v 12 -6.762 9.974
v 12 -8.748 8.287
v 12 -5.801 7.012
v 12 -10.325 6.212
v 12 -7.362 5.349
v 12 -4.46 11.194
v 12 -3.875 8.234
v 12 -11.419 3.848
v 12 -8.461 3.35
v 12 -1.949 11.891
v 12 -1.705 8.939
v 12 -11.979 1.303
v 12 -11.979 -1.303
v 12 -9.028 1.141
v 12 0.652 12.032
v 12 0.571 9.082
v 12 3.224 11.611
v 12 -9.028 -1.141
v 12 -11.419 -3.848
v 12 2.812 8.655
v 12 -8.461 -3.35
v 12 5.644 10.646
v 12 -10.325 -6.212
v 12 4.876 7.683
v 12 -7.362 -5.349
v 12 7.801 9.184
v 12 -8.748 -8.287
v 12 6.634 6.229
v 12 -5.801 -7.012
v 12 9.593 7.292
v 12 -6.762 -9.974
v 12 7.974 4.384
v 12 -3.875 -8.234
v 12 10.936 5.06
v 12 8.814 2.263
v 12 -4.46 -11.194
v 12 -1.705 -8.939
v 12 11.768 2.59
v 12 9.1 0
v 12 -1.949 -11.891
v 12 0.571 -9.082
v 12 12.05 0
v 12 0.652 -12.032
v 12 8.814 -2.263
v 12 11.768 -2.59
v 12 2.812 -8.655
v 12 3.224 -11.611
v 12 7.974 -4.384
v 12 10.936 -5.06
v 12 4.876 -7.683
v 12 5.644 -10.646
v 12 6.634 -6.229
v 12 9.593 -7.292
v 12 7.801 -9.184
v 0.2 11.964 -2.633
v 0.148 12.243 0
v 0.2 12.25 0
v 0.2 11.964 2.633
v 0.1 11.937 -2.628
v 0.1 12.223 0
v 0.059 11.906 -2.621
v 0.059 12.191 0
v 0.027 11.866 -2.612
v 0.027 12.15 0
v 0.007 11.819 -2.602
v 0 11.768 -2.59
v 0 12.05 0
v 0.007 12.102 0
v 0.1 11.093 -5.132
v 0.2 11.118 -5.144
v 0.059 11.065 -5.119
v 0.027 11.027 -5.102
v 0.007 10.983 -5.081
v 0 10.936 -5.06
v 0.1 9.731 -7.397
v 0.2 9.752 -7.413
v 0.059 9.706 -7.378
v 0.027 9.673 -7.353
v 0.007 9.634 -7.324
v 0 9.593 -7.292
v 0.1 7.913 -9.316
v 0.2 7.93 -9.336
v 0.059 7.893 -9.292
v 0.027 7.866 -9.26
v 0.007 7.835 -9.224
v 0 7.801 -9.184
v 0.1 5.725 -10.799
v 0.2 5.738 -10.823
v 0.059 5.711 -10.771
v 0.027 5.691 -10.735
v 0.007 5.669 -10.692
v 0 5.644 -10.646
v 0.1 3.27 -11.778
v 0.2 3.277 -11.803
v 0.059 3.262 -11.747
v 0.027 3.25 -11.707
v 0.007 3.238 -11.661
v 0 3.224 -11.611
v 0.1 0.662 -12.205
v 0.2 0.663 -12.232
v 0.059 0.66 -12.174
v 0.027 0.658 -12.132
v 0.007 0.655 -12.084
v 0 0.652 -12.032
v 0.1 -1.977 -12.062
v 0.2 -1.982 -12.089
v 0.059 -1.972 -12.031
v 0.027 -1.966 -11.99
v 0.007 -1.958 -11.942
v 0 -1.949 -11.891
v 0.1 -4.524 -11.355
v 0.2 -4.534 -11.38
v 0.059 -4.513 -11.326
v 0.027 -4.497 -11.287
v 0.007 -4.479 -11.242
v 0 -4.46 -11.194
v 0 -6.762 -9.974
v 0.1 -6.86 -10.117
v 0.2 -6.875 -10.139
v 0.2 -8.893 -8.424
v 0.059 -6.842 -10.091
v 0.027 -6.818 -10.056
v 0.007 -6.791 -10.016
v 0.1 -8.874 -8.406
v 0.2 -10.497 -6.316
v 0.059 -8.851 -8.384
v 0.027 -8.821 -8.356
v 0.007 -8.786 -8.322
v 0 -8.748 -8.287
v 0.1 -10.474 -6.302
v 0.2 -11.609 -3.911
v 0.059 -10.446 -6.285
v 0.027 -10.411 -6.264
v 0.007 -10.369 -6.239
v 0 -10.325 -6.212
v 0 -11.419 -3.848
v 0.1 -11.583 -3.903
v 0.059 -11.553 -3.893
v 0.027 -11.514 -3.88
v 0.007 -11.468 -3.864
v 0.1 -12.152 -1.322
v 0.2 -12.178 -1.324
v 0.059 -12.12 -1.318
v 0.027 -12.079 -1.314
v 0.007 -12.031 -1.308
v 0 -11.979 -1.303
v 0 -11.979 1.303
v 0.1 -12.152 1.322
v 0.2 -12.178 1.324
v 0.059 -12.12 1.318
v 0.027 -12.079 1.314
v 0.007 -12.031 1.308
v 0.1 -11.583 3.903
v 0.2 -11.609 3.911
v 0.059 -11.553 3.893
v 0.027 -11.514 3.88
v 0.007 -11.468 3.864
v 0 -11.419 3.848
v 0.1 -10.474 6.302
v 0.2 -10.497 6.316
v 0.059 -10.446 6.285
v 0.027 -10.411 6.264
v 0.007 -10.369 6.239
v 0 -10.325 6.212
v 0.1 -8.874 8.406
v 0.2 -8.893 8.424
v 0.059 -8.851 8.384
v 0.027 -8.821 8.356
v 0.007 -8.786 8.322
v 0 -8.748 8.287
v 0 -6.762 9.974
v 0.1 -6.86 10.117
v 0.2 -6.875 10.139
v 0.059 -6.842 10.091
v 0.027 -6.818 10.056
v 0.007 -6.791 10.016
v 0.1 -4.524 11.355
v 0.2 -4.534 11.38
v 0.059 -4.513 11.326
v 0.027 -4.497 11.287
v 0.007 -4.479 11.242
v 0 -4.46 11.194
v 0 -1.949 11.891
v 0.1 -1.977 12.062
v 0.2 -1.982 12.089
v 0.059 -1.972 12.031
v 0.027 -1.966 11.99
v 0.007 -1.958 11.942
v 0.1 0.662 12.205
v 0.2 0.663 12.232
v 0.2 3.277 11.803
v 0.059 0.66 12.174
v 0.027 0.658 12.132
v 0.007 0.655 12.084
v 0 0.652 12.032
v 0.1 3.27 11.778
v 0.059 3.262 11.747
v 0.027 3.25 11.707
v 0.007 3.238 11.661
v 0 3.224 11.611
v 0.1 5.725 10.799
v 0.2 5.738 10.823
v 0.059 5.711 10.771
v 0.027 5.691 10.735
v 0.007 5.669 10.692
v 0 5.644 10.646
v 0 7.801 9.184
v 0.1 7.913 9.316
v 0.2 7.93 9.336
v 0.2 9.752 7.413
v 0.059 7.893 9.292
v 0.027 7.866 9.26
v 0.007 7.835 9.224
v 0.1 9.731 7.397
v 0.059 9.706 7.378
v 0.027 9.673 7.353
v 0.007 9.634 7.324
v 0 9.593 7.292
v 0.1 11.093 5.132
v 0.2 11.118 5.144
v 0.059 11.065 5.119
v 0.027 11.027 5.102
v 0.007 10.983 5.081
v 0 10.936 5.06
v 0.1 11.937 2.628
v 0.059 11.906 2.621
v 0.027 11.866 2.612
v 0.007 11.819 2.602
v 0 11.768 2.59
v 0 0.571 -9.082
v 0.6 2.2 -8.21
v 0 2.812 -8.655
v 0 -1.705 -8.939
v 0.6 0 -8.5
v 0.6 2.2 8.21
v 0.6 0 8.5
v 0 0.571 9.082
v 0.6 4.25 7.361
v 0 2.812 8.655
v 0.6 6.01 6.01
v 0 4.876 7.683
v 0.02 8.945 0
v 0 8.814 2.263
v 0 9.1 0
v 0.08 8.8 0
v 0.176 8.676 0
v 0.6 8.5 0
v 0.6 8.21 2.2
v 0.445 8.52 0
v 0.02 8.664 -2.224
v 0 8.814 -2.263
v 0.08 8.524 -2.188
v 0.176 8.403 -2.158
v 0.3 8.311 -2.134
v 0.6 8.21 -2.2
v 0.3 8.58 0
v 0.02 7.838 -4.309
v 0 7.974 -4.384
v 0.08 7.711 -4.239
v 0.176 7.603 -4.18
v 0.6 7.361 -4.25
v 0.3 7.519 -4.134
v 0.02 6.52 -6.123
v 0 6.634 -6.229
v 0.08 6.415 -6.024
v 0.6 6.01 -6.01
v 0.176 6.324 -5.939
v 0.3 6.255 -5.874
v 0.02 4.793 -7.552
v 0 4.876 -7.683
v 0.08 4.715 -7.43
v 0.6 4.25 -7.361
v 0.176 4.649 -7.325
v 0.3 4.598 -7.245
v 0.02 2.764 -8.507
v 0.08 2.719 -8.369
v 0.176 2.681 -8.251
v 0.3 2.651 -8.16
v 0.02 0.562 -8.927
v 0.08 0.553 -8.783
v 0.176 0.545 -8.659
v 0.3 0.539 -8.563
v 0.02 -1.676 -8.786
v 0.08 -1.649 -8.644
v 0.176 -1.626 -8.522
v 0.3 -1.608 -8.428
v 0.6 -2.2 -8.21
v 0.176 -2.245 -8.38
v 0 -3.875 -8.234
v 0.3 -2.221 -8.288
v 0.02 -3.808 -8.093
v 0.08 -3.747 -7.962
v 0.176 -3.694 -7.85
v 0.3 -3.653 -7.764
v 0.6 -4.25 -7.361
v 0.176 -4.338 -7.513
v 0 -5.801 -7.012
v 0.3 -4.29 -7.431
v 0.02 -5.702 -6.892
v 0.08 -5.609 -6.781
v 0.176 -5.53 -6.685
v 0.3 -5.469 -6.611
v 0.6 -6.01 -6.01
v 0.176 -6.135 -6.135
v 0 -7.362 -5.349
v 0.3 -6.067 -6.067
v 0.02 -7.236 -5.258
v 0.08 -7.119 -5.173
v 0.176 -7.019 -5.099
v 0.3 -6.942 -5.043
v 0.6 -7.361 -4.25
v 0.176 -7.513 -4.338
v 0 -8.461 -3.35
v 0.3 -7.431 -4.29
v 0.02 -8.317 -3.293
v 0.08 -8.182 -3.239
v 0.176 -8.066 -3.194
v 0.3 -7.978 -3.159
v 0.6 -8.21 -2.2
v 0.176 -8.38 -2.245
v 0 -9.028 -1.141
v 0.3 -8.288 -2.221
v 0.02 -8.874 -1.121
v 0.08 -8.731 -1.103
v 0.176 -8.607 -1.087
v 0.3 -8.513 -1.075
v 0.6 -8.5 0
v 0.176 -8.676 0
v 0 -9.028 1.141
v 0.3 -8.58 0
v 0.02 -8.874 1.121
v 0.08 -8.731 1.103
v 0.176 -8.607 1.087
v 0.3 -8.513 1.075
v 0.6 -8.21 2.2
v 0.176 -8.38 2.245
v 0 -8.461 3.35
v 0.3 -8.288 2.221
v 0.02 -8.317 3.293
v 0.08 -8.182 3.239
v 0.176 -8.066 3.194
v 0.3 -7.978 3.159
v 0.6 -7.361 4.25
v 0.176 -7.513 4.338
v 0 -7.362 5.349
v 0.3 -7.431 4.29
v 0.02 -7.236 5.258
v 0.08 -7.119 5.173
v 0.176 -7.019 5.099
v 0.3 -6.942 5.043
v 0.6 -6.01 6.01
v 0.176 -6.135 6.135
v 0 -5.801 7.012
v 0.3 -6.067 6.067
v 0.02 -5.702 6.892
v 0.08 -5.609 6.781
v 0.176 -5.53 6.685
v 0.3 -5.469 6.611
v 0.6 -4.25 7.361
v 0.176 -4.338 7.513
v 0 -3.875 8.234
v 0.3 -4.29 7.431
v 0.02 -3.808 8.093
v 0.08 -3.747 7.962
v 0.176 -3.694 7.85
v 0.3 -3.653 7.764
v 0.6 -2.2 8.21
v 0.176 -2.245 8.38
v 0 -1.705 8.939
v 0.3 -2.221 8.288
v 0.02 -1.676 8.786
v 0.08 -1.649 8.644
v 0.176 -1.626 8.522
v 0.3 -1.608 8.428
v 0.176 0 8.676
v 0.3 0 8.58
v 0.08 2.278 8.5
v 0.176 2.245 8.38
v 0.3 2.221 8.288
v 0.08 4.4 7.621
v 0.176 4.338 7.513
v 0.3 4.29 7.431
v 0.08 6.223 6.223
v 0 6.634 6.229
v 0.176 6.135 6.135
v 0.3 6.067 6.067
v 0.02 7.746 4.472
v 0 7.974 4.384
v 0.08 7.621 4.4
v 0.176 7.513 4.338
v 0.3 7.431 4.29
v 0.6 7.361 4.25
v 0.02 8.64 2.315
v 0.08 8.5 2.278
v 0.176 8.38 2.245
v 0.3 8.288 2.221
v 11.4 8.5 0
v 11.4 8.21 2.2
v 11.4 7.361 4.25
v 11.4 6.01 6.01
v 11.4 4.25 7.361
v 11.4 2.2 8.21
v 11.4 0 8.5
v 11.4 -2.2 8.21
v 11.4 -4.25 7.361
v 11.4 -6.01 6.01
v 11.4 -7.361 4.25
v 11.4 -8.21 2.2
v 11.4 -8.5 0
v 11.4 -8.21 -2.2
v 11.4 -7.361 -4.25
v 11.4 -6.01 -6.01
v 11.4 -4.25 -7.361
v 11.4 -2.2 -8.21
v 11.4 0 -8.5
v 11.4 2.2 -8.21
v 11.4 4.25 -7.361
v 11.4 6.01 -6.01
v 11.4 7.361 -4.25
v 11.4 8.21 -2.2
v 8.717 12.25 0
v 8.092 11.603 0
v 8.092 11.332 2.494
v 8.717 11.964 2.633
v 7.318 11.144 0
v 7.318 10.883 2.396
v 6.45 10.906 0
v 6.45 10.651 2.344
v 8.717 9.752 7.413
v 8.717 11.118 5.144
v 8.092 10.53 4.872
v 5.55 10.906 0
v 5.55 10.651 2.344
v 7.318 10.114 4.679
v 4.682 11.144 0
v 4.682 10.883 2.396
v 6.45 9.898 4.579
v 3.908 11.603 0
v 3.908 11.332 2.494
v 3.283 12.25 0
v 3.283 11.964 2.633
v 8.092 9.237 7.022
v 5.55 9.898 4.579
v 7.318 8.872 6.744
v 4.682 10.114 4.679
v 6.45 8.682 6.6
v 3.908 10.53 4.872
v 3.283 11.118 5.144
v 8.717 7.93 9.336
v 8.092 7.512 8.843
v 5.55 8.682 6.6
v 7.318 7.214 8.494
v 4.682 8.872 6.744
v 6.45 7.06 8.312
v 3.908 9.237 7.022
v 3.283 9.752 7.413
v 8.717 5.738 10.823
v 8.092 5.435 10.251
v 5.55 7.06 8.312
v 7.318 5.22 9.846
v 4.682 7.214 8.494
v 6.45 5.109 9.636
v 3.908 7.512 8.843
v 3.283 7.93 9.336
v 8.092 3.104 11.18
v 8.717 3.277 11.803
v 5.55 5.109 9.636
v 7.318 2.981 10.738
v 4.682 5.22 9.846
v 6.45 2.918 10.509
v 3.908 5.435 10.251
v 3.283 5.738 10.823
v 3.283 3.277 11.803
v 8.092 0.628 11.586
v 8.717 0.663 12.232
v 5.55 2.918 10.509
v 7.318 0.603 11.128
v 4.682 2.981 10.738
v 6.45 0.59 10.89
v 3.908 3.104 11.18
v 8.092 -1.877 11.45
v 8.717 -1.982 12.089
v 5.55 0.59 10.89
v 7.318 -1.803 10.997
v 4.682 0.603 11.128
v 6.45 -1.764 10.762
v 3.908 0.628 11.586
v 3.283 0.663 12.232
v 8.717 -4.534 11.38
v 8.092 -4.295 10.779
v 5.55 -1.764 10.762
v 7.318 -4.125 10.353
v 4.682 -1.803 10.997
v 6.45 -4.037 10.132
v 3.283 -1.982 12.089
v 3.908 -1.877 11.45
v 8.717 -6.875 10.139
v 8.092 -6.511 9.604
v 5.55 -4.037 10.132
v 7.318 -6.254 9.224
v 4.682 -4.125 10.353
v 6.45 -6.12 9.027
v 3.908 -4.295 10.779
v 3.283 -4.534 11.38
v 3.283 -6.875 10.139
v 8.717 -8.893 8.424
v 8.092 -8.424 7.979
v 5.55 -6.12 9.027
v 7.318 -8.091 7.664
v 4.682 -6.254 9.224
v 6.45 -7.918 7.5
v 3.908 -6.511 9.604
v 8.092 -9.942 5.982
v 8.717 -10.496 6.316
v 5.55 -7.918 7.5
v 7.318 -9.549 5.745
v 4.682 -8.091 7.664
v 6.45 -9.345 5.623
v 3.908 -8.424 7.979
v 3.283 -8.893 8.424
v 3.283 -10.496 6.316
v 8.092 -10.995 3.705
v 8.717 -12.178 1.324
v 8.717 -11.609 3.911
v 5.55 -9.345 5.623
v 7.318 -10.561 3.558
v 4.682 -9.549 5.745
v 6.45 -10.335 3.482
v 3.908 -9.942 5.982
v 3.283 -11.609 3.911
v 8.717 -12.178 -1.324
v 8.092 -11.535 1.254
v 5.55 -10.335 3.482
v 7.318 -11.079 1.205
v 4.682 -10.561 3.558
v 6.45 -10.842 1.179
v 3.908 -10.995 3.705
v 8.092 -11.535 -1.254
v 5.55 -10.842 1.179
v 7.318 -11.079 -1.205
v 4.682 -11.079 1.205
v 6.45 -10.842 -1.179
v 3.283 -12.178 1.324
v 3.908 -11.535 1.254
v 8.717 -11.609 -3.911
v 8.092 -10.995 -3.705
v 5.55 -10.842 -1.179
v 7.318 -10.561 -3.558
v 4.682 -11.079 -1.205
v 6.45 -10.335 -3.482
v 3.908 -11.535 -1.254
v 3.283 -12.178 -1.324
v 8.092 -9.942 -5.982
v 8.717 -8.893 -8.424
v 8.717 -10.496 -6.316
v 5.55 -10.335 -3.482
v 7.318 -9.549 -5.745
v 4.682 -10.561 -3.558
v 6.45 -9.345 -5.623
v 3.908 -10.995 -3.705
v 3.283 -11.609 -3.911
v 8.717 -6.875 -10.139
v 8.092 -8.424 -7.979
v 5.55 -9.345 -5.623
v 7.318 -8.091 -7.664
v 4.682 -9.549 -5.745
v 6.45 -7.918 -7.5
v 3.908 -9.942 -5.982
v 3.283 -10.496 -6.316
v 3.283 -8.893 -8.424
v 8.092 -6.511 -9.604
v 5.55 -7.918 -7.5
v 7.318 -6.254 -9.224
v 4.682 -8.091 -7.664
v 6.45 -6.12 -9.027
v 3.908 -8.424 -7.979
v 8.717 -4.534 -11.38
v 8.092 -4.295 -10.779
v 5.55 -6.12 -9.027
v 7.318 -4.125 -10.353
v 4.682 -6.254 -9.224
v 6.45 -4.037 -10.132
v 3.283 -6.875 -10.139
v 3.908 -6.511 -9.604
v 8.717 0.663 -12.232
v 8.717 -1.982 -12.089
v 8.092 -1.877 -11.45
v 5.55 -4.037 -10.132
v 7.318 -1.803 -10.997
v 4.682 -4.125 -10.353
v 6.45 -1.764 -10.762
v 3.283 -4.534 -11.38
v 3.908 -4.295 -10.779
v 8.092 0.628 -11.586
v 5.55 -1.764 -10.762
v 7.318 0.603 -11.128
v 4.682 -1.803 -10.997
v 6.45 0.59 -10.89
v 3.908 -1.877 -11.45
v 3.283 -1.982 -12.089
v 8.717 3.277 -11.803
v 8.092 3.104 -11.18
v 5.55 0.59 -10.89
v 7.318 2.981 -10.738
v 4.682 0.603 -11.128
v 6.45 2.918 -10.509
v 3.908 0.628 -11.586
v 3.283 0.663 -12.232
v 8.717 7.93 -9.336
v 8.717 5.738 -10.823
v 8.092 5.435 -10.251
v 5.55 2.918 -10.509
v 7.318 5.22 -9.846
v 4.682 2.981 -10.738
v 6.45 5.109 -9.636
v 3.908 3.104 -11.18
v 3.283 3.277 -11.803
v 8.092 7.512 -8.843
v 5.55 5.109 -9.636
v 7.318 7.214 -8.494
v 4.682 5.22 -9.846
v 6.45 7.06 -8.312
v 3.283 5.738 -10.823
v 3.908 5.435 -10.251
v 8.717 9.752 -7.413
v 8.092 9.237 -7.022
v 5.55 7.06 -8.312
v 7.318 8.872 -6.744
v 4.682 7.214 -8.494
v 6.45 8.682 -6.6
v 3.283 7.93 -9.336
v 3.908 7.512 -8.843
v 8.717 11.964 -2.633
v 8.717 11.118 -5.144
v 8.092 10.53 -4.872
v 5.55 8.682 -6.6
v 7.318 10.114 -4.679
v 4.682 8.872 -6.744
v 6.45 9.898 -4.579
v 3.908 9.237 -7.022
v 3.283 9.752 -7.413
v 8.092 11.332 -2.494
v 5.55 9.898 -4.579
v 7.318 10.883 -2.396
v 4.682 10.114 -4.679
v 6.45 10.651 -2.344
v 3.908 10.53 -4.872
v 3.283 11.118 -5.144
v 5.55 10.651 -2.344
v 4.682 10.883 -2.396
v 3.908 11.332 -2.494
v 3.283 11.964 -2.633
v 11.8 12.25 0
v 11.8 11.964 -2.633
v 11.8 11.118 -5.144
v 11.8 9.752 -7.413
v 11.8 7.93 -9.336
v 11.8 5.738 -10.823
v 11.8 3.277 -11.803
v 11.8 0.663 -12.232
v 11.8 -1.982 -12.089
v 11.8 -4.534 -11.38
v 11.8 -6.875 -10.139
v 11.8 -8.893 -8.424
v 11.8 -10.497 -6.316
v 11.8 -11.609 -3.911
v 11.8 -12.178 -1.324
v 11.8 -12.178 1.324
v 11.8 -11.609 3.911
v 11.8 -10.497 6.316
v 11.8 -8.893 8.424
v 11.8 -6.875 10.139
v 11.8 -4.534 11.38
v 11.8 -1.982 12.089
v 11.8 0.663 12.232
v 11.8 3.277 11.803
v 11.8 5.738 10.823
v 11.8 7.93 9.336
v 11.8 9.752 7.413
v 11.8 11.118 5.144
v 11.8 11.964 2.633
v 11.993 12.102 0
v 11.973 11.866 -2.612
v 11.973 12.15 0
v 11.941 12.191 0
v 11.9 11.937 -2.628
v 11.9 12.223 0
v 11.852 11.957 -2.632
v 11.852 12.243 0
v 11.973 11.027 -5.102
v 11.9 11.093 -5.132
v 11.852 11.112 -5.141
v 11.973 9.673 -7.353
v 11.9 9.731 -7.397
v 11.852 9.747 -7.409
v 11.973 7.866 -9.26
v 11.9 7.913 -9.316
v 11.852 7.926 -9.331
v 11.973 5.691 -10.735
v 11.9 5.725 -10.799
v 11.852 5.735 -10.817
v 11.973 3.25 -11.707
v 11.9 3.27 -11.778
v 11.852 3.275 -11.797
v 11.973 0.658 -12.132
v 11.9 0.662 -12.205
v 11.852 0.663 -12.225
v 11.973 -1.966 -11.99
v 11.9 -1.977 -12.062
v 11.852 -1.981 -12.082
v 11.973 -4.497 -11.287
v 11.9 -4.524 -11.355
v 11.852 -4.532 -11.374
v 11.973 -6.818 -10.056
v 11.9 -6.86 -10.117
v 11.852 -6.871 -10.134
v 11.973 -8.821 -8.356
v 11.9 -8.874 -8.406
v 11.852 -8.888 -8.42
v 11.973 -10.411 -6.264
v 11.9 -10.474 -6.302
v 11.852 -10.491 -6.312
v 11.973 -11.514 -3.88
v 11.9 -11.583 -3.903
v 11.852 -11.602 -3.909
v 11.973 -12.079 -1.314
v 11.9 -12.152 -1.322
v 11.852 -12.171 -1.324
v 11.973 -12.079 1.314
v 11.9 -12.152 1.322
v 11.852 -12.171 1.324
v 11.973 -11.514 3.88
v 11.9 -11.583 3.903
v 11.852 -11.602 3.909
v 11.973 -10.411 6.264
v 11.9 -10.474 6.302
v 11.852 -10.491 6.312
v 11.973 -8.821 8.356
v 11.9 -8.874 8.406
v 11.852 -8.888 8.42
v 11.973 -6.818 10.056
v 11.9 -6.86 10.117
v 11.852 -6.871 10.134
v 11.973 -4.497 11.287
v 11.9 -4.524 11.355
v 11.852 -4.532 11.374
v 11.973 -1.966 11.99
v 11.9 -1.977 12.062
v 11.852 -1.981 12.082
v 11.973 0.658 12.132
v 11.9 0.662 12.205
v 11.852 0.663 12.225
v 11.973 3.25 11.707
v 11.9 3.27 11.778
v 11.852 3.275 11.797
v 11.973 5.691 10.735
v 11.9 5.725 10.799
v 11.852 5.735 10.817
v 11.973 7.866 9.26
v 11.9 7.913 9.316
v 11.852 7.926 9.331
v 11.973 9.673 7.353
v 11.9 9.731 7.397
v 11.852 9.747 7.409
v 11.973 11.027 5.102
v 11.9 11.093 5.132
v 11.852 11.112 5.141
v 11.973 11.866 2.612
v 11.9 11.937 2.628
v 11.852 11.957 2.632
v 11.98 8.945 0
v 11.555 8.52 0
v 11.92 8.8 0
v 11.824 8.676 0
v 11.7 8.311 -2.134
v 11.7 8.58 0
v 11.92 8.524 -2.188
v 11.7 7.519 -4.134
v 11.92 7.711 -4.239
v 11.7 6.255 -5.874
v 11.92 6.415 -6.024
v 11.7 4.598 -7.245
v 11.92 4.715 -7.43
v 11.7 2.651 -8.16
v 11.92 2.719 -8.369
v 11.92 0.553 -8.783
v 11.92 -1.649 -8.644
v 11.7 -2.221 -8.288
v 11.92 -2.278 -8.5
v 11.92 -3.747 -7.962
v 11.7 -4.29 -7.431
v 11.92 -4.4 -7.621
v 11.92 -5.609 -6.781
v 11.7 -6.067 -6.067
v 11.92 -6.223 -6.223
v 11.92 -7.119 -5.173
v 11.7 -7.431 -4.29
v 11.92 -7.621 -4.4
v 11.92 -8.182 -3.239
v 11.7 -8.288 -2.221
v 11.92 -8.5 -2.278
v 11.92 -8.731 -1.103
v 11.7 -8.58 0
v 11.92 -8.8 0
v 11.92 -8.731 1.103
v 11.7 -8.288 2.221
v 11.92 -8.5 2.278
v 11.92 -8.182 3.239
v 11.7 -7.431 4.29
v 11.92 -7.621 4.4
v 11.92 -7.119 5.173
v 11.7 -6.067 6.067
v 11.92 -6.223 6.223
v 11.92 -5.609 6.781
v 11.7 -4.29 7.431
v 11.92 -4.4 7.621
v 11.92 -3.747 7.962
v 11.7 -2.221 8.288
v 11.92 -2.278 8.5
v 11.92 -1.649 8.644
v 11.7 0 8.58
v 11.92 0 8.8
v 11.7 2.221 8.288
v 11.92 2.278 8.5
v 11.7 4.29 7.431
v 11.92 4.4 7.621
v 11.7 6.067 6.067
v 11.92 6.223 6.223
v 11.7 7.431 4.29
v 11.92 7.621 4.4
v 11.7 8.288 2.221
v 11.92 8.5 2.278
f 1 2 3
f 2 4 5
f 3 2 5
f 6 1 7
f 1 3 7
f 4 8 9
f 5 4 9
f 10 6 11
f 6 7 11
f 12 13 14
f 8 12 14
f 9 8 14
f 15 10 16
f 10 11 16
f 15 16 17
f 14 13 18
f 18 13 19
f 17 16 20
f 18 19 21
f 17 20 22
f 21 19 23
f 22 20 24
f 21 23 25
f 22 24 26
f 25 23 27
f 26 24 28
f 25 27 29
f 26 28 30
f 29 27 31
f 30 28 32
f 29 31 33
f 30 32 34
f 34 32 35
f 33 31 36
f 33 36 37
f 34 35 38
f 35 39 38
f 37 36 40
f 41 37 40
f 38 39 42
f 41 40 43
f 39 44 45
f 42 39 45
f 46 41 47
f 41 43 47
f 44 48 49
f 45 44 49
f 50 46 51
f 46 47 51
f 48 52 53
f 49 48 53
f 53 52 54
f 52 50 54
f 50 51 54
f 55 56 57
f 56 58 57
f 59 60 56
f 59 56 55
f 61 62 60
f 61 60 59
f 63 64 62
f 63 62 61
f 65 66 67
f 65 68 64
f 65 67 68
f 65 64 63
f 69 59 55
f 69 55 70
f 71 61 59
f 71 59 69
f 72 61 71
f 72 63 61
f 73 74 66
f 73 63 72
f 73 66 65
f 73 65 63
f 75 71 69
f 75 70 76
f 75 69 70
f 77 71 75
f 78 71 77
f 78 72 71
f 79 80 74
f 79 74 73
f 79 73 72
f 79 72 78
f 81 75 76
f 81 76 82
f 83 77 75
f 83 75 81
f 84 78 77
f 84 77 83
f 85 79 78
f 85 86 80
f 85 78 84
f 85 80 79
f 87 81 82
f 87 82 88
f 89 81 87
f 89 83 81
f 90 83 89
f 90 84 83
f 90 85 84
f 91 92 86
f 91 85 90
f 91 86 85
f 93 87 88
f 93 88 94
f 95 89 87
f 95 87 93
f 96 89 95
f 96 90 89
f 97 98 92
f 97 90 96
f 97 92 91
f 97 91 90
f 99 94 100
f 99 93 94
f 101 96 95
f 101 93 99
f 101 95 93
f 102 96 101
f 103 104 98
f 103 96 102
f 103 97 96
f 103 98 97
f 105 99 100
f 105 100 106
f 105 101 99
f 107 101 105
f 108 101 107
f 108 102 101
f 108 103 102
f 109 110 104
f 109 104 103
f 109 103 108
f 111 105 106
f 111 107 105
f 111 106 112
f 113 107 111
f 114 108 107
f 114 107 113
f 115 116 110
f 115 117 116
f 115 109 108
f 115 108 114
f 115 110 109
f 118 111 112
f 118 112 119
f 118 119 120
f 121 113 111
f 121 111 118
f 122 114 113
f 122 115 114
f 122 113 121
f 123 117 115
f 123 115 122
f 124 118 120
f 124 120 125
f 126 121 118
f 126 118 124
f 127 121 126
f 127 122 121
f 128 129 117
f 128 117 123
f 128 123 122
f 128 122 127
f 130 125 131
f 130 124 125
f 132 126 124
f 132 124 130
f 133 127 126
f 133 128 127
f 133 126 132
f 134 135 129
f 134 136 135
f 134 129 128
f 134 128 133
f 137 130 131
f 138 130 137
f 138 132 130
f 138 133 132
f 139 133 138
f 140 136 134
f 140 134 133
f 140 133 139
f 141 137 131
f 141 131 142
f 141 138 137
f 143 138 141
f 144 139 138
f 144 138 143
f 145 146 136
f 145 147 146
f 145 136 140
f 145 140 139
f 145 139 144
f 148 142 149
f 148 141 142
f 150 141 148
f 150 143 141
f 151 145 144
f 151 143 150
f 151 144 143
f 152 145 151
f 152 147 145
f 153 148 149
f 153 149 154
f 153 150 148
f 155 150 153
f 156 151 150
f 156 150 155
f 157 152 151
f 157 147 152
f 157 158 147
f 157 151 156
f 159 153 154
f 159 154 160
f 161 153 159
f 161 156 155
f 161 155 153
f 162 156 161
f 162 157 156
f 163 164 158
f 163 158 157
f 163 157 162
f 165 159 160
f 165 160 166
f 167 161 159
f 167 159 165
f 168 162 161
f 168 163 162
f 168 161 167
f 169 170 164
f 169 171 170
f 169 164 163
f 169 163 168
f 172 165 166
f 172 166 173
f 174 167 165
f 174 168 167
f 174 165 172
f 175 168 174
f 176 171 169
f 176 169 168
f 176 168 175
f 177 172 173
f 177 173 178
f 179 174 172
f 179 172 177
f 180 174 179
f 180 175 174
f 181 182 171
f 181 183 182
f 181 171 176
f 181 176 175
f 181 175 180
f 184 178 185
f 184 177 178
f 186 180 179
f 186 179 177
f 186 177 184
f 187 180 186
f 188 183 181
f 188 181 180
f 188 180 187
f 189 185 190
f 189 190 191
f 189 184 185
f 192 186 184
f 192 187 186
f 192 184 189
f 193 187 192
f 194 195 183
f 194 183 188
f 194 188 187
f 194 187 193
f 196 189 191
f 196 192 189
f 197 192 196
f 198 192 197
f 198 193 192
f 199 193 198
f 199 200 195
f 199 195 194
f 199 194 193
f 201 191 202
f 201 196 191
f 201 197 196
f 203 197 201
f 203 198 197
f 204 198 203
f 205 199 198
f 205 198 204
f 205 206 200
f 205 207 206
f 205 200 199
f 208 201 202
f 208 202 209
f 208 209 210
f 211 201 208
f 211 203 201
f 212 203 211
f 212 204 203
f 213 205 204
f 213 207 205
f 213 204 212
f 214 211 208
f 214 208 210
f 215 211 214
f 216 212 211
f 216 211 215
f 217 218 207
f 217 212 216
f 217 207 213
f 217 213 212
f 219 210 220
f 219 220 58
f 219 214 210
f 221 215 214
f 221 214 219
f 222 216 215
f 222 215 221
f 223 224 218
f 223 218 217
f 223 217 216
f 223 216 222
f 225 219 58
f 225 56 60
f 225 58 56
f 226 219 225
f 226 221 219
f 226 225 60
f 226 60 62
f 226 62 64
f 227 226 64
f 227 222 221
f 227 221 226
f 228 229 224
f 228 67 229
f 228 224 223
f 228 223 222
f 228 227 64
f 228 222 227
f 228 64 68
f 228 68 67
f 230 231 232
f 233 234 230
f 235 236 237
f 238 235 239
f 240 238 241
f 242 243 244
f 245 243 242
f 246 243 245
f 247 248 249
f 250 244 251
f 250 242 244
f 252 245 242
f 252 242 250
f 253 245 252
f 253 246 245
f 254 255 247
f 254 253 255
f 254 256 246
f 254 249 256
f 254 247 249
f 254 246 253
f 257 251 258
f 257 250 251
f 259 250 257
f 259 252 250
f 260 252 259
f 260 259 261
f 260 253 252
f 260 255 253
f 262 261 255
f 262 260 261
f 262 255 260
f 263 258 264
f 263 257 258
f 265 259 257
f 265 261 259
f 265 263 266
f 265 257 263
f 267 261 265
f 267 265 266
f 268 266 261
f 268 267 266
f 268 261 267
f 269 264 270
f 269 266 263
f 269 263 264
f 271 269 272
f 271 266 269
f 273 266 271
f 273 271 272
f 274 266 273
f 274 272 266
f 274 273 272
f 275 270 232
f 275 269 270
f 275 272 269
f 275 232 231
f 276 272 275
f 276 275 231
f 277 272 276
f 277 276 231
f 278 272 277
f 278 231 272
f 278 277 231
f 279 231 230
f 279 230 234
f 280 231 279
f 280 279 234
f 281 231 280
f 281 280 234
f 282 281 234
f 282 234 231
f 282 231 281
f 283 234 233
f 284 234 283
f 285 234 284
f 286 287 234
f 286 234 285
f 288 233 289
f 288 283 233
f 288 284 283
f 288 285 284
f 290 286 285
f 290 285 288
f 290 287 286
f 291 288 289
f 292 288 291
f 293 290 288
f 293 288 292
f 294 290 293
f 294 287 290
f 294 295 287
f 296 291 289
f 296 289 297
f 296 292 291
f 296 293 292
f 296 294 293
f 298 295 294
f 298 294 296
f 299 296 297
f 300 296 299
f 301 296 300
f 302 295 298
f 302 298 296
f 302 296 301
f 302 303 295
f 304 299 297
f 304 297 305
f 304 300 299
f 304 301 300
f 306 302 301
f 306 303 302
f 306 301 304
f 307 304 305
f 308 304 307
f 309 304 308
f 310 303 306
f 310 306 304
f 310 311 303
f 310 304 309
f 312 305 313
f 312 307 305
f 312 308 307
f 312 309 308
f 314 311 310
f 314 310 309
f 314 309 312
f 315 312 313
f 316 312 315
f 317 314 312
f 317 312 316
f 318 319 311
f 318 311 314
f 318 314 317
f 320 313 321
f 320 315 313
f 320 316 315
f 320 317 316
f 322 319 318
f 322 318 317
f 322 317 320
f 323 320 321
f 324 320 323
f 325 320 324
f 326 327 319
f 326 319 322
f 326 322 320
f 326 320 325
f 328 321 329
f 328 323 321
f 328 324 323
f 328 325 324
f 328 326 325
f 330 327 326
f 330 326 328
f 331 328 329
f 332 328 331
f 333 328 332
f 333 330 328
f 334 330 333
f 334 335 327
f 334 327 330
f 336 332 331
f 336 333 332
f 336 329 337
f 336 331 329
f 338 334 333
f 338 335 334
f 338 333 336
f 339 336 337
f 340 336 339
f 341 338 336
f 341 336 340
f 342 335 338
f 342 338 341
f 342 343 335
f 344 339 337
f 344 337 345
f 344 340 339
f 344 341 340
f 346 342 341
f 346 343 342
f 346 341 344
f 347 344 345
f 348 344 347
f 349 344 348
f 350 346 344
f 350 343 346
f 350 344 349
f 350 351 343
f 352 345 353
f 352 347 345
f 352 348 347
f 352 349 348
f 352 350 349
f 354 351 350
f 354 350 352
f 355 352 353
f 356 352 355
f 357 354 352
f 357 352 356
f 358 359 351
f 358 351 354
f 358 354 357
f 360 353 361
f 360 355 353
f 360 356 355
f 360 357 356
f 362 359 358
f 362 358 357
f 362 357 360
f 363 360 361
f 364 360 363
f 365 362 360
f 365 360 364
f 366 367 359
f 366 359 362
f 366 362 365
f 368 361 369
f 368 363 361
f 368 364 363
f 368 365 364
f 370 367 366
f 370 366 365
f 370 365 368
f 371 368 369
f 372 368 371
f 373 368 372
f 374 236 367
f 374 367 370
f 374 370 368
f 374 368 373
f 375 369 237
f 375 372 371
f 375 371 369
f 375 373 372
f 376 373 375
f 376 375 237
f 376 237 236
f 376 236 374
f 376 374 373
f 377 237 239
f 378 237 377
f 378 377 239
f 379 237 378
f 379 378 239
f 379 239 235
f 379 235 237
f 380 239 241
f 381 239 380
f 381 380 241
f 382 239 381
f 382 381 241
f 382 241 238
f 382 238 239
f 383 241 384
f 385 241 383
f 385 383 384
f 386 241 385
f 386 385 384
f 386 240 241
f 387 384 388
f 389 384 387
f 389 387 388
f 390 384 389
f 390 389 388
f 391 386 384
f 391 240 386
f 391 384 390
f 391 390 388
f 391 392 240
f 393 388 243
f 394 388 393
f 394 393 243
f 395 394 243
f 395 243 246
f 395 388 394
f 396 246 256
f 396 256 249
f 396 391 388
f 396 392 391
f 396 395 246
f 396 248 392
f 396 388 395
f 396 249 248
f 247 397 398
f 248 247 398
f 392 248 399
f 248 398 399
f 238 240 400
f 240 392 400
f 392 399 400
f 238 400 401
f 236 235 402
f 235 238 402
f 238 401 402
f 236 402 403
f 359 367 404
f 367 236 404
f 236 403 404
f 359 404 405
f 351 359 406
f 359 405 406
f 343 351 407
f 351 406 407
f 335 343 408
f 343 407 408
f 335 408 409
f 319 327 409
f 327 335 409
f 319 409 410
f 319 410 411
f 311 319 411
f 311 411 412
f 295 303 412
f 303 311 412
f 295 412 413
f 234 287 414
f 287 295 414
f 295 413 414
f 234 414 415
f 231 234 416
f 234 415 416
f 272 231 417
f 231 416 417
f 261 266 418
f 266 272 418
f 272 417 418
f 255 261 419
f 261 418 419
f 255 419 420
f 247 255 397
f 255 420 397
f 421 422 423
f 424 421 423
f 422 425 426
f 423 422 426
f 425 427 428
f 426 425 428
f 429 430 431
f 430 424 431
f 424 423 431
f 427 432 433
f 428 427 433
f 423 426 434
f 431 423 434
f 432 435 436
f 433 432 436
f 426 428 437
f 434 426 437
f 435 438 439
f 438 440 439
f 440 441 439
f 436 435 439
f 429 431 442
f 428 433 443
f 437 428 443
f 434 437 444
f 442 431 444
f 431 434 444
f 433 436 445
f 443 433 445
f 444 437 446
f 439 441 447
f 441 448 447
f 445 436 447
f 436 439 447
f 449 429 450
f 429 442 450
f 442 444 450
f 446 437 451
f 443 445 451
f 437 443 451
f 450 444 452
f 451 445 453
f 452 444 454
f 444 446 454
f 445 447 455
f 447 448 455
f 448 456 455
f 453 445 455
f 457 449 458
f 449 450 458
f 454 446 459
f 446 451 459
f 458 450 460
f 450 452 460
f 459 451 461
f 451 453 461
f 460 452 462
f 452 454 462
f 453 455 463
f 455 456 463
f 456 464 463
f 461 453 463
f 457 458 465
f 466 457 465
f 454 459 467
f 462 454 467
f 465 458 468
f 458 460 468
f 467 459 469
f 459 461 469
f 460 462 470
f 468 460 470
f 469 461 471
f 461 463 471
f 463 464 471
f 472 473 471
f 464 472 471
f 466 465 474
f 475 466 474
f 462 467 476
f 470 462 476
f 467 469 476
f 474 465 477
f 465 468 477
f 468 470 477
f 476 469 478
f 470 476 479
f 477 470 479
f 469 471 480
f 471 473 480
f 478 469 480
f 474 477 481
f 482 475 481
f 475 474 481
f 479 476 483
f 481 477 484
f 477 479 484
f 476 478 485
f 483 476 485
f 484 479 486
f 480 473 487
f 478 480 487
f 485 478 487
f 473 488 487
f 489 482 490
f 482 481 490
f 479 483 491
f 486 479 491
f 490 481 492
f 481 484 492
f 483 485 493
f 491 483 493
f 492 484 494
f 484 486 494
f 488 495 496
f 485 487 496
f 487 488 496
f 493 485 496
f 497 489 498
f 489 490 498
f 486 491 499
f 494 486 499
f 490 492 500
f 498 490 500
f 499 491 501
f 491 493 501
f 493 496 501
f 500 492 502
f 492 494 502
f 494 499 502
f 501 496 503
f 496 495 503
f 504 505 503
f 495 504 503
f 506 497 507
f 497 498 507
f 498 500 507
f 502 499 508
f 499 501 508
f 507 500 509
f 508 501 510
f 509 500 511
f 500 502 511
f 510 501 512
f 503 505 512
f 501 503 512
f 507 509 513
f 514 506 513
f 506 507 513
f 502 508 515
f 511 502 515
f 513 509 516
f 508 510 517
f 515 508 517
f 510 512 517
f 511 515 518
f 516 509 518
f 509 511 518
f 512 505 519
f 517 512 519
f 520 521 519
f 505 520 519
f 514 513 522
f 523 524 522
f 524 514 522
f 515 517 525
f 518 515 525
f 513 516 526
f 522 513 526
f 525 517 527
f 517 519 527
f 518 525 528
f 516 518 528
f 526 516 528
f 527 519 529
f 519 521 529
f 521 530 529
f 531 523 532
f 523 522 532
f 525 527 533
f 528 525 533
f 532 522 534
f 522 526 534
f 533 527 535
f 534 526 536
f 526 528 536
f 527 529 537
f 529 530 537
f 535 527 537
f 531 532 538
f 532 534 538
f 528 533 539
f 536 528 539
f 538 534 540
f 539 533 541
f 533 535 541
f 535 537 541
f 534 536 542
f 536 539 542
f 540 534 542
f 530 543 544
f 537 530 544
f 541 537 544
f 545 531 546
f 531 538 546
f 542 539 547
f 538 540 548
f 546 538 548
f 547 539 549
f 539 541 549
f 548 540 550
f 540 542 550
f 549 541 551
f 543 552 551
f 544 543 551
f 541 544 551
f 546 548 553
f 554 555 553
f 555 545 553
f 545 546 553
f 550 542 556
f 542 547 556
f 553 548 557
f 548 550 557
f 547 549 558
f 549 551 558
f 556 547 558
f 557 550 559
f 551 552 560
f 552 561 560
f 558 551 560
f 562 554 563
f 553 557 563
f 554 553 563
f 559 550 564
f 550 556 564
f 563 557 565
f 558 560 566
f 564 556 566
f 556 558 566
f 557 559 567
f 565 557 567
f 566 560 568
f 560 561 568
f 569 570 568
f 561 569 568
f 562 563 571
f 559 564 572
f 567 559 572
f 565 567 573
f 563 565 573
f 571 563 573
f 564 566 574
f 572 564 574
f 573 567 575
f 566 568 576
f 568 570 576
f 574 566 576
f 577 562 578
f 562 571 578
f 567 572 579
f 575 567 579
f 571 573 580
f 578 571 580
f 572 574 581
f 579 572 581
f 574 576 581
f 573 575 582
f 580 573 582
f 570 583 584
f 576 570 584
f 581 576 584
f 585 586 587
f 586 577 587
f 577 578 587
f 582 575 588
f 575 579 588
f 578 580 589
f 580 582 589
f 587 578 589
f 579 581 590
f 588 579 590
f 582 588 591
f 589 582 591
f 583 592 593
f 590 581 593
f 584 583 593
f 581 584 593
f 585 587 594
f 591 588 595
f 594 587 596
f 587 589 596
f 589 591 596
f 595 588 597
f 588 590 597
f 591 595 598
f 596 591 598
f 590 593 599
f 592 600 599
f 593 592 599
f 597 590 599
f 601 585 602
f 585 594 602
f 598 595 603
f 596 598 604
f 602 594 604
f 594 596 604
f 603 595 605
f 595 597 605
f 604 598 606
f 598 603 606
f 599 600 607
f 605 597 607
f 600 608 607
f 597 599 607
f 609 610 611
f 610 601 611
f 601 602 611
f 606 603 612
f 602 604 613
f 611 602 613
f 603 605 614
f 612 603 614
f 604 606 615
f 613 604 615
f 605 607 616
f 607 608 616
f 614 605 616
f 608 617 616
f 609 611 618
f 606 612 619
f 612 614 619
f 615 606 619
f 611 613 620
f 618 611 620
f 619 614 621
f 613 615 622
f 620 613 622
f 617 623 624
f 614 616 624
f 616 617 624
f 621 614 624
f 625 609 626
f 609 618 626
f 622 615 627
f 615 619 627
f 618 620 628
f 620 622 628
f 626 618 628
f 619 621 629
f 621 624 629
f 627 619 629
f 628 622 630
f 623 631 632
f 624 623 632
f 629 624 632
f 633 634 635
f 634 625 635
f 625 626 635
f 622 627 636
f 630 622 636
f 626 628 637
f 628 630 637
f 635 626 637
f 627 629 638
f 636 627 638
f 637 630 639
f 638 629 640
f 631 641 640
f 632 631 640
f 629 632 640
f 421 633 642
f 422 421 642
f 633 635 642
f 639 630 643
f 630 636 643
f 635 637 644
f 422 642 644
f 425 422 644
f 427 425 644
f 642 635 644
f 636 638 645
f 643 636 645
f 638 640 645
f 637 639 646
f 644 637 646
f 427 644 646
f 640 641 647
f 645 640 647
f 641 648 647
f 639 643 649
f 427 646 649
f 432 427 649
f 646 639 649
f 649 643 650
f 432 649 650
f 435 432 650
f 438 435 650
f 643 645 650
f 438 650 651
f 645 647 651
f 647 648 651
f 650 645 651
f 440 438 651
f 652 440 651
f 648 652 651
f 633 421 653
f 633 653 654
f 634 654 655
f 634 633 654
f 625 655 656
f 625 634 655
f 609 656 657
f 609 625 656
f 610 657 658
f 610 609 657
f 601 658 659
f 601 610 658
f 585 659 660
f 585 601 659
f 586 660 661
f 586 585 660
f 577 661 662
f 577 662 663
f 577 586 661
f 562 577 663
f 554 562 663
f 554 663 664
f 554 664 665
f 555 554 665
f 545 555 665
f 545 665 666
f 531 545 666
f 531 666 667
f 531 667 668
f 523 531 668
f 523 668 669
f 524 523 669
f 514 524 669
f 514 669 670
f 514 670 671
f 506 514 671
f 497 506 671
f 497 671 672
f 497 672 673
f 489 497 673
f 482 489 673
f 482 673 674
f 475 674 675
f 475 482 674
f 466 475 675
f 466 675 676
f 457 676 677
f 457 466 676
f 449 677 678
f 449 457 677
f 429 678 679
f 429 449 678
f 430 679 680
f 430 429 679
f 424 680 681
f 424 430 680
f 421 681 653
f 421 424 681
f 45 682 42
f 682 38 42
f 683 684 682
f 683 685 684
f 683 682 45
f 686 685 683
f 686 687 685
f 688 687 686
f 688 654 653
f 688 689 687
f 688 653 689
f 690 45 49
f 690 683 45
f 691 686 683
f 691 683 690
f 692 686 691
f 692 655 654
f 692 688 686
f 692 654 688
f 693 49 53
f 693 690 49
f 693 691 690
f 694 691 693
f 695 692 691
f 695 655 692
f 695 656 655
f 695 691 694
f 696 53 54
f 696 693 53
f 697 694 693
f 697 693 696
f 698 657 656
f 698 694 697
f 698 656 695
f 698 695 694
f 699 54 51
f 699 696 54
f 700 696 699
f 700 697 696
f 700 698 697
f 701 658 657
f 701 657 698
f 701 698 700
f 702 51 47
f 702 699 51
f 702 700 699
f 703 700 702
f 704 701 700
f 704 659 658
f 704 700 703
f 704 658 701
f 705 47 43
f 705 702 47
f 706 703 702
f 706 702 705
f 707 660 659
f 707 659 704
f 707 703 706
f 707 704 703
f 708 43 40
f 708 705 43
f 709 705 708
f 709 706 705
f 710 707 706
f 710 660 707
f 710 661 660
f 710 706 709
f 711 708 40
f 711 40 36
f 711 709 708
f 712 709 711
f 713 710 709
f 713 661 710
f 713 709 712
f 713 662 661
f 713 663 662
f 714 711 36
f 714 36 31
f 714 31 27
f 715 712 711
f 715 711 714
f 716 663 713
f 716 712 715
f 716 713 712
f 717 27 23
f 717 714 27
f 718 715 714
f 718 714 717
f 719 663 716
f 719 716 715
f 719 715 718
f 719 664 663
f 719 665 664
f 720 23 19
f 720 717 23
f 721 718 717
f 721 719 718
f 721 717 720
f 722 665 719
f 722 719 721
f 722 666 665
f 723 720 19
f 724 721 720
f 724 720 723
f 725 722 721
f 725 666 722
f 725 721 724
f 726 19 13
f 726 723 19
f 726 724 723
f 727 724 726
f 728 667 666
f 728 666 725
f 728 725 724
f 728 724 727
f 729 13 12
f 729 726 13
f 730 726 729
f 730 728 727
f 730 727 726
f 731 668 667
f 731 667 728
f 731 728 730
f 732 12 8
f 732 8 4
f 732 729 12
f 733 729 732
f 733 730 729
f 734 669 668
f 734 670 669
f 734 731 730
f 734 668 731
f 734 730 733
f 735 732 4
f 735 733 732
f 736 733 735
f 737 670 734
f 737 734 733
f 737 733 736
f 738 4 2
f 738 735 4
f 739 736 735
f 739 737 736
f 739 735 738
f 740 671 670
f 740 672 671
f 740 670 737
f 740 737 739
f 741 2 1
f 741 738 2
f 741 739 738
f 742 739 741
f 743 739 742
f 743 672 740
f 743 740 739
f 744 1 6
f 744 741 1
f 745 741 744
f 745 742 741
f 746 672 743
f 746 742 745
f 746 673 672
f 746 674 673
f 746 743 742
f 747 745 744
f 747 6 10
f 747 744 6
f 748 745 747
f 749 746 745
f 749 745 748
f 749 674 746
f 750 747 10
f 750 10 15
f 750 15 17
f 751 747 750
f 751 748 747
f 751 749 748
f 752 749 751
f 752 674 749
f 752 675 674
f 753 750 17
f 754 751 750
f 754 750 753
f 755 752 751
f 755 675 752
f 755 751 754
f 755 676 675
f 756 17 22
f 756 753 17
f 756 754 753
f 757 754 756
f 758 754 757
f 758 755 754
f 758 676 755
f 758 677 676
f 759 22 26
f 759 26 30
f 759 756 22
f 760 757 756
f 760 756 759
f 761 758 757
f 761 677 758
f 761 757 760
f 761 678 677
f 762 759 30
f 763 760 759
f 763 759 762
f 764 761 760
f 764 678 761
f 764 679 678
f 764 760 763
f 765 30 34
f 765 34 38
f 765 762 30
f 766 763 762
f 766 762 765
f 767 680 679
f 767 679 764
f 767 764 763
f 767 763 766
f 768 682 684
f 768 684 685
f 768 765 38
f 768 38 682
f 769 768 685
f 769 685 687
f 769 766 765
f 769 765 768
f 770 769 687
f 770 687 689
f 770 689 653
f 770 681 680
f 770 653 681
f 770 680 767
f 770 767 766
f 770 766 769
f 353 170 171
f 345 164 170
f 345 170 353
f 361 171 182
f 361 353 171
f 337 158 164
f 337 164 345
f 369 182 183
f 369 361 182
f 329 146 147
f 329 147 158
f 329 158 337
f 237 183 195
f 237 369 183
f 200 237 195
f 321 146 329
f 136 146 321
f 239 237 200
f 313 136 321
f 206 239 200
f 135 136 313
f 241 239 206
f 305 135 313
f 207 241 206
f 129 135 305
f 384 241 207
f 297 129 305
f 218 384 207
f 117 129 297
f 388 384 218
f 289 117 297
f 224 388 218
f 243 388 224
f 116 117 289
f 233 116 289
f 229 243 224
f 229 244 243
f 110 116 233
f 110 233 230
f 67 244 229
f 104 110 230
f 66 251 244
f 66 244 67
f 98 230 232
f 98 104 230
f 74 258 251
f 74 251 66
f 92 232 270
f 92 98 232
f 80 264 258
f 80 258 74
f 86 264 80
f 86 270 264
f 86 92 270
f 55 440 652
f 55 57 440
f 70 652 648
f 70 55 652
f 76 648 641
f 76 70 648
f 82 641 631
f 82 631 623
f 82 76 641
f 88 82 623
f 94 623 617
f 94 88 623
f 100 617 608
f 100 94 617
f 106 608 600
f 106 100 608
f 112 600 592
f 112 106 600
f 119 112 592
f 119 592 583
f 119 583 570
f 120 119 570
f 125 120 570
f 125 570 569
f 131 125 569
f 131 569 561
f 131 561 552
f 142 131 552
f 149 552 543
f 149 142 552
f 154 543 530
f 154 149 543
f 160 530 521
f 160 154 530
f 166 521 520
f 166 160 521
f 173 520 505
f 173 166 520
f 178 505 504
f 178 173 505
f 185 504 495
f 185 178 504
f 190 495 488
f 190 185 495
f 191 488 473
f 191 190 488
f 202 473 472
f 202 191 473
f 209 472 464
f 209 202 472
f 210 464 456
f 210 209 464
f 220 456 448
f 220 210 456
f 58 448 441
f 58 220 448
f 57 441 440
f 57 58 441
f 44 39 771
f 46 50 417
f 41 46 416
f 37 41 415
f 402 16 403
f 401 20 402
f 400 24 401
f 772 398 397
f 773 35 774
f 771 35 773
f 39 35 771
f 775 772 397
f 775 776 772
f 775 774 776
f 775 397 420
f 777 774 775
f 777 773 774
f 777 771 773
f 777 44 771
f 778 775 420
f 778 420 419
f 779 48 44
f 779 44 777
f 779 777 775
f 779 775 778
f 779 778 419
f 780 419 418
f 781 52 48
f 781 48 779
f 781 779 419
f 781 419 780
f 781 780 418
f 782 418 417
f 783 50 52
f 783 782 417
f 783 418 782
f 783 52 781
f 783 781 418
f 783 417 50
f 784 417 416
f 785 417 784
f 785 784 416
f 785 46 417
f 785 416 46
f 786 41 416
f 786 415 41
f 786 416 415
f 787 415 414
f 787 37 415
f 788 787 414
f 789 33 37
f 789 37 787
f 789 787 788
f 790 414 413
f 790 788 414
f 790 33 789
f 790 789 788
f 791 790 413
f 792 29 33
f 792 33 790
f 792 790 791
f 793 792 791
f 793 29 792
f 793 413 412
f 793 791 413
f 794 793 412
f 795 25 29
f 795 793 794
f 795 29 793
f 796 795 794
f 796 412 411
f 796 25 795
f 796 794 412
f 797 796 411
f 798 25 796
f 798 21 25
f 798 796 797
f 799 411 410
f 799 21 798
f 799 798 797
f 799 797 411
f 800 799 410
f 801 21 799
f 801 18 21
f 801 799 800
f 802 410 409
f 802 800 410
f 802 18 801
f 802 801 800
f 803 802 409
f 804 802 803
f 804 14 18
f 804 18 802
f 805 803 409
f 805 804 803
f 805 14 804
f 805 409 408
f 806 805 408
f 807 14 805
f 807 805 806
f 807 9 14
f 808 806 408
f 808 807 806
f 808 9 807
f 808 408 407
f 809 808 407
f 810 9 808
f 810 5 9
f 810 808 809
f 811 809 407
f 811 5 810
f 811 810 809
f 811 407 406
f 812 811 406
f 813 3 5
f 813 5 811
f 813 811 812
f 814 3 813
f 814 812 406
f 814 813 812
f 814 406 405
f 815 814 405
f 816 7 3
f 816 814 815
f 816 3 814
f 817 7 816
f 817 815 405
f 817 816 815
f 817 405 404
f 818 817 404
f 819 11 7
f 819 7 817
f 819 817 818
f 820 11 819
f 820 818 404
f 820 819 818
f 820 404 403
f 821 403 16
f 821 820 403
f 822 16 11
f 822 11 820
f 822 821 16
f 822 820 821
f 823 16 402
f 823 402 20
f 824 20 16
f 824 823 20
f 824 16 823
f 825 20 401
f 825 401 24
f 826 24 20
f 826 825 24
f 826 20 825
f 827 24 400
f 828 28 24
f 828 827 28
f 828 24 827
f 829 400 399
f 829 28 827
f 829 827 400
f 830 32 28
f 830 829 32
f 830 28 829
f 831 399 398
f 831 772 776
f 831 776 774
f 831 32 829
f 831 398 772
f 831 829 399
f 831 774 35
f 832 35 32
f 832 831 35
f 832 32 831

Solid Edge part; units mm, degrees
sketch "Sketch1" plane through (0, 0, 0) normal (0, 0, 1) x (1, 0, 0)
  arc A0 (0, 9.1) -> (0.6, 8.5) centre (0.6, 9.1) ccw
  line L0 (0.6, 8.5) -> (11.4, 8.5)
  arc A1 (11.4, 8.5) -> (12, 9.1) centre (11.4, 9.1) ccw
  line L1 (12, 9.1) -> (12, 12.05)
  arc A2 (12, 12.05) -> (11.8, 12.25) centre (11.8, 12.05) ccw
  line L2 (11.8, 12.25) -> (8.7173, 12.25)
  arc A3 (8.7173, 12.25) -> (3.2827, 12.25) centre (6, 14.25) cw
  line L3 (3.2827, 12.25) -> (0.2, 12.25)
  arc A4 (0.2, 12.25) -> (0, 12.05) centre (0.2, 12.05) ccw
  line L4 (0, 12.05) -> (0, 9.1)
revolve "RevolvedProtrusion1" add sketch "Sketch1" angle 360 about axis through (11.4, 0, 0) along (-1, 0, 0)
